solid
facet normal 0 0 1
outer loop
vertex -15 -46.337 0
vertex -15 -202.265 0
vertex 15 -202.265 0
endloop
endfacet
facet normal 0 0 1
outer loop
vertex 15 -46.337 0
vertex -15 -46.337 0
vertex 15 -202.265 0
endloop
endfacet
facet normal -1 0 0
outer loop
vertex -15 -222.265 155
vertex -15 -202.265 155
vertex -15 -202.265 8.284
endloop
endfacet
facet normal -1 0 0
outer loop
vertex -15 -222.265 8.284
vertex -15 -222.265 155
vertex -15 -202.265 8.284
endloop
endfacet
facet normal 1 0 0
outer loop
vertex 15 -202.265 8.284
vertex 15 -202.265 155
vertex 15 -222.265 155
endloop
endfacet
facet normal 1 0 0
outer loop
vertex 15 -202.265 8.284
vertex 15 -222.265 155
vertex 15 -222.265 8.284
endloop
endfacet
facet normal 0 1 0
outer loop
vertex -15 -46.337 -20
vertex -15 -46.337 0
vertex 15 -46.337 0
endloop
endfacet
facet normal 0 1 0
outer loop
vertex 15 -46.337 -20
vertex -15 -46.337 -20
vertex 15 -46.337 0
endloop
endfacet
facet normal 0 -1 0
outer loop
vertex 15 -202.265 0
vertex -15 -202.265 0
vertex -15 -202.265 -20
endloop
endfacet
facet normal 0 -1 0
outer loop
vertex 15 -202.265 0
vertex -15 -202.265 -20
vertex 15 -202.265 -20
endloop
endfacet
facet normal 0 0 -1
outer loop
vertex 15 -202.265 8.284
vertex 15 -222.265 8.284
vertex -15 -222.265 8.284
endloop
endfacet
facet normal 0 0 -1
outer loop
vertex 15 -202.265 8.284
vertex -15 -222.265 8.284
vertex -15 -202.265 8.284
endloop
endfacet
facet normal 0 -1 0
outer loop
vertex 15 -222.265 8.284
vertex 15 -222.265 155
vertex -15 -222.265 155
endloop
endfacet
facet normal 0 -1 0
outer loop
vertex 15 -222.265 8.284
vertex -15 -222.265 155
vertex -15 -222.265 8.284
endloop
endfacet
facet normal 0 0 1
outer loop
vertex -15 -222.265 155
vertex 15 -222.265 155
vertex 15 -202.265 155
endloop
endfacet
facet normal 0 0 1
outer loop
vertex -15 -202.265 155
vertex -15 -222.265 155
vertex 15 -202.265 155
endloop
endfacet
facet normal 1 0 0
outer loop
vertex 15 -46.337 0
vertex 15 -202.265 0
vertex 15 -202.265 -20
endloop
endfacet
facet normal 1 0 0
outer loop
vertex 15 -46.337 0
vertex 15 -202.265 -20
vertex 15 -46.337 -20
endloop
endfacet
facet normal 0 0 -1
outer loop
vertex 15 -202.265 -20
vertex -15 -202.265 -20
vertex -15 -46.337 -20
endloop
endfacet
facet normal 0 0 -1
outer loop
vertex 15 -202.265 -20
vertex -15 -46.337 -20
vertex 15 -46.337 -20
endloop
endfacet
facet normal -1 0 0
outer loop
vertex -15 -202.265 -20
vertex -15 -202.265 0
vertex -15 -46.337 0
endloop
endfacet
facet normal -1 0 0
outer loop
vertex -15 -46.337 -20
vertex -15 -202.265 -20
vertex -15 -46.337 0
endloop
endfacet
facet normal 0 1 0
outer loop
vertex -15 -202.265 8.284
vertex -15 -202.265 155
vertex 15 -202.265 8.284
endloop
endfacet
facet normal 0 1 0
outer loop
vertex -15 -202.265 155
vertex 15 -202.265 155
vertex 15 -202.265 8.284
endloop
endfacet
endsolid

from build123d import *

# Parameters (mm, degrees)
SKETCH11_W          = 30
SKETCH11_H          = 155.928336779
BOSS_EXTRUDE2_DEPTH = 20
SKETCH16_W          = 146.715728753
SKETCH16_H          = 20
BOSS_EXTRUDE3_DEPTH = 15


with BuildPart() as part:
    # Sketch11 → Boss-Extrude2 (new body)
    with BuildSketch(Plane.XY):
        with Locations((0, -124.300831611)):
            Rectangle(SKETCH11_W, SKETCH11_H)
    extrude(amount=-BOSS_EXTRUDE2_DEPTH)


with BuildPart() as body_2:
    # Sketch16 → Boss-Extrude3 (new, symmetric)
    with BuildSketch(Plane(origin=(0, 0, 0), x_dir=(0, 0, -1), z_dir=(1, 0, 0))):
        with Locations((-81.642135623, -212.265)):
            Rectangle(SKETCH16_W, SKETCH16_H)
    extrude(amount=BOSS_EXTRUDE3_DEPTH, both=True)


solid = Compound([part.part, body_2.part])
